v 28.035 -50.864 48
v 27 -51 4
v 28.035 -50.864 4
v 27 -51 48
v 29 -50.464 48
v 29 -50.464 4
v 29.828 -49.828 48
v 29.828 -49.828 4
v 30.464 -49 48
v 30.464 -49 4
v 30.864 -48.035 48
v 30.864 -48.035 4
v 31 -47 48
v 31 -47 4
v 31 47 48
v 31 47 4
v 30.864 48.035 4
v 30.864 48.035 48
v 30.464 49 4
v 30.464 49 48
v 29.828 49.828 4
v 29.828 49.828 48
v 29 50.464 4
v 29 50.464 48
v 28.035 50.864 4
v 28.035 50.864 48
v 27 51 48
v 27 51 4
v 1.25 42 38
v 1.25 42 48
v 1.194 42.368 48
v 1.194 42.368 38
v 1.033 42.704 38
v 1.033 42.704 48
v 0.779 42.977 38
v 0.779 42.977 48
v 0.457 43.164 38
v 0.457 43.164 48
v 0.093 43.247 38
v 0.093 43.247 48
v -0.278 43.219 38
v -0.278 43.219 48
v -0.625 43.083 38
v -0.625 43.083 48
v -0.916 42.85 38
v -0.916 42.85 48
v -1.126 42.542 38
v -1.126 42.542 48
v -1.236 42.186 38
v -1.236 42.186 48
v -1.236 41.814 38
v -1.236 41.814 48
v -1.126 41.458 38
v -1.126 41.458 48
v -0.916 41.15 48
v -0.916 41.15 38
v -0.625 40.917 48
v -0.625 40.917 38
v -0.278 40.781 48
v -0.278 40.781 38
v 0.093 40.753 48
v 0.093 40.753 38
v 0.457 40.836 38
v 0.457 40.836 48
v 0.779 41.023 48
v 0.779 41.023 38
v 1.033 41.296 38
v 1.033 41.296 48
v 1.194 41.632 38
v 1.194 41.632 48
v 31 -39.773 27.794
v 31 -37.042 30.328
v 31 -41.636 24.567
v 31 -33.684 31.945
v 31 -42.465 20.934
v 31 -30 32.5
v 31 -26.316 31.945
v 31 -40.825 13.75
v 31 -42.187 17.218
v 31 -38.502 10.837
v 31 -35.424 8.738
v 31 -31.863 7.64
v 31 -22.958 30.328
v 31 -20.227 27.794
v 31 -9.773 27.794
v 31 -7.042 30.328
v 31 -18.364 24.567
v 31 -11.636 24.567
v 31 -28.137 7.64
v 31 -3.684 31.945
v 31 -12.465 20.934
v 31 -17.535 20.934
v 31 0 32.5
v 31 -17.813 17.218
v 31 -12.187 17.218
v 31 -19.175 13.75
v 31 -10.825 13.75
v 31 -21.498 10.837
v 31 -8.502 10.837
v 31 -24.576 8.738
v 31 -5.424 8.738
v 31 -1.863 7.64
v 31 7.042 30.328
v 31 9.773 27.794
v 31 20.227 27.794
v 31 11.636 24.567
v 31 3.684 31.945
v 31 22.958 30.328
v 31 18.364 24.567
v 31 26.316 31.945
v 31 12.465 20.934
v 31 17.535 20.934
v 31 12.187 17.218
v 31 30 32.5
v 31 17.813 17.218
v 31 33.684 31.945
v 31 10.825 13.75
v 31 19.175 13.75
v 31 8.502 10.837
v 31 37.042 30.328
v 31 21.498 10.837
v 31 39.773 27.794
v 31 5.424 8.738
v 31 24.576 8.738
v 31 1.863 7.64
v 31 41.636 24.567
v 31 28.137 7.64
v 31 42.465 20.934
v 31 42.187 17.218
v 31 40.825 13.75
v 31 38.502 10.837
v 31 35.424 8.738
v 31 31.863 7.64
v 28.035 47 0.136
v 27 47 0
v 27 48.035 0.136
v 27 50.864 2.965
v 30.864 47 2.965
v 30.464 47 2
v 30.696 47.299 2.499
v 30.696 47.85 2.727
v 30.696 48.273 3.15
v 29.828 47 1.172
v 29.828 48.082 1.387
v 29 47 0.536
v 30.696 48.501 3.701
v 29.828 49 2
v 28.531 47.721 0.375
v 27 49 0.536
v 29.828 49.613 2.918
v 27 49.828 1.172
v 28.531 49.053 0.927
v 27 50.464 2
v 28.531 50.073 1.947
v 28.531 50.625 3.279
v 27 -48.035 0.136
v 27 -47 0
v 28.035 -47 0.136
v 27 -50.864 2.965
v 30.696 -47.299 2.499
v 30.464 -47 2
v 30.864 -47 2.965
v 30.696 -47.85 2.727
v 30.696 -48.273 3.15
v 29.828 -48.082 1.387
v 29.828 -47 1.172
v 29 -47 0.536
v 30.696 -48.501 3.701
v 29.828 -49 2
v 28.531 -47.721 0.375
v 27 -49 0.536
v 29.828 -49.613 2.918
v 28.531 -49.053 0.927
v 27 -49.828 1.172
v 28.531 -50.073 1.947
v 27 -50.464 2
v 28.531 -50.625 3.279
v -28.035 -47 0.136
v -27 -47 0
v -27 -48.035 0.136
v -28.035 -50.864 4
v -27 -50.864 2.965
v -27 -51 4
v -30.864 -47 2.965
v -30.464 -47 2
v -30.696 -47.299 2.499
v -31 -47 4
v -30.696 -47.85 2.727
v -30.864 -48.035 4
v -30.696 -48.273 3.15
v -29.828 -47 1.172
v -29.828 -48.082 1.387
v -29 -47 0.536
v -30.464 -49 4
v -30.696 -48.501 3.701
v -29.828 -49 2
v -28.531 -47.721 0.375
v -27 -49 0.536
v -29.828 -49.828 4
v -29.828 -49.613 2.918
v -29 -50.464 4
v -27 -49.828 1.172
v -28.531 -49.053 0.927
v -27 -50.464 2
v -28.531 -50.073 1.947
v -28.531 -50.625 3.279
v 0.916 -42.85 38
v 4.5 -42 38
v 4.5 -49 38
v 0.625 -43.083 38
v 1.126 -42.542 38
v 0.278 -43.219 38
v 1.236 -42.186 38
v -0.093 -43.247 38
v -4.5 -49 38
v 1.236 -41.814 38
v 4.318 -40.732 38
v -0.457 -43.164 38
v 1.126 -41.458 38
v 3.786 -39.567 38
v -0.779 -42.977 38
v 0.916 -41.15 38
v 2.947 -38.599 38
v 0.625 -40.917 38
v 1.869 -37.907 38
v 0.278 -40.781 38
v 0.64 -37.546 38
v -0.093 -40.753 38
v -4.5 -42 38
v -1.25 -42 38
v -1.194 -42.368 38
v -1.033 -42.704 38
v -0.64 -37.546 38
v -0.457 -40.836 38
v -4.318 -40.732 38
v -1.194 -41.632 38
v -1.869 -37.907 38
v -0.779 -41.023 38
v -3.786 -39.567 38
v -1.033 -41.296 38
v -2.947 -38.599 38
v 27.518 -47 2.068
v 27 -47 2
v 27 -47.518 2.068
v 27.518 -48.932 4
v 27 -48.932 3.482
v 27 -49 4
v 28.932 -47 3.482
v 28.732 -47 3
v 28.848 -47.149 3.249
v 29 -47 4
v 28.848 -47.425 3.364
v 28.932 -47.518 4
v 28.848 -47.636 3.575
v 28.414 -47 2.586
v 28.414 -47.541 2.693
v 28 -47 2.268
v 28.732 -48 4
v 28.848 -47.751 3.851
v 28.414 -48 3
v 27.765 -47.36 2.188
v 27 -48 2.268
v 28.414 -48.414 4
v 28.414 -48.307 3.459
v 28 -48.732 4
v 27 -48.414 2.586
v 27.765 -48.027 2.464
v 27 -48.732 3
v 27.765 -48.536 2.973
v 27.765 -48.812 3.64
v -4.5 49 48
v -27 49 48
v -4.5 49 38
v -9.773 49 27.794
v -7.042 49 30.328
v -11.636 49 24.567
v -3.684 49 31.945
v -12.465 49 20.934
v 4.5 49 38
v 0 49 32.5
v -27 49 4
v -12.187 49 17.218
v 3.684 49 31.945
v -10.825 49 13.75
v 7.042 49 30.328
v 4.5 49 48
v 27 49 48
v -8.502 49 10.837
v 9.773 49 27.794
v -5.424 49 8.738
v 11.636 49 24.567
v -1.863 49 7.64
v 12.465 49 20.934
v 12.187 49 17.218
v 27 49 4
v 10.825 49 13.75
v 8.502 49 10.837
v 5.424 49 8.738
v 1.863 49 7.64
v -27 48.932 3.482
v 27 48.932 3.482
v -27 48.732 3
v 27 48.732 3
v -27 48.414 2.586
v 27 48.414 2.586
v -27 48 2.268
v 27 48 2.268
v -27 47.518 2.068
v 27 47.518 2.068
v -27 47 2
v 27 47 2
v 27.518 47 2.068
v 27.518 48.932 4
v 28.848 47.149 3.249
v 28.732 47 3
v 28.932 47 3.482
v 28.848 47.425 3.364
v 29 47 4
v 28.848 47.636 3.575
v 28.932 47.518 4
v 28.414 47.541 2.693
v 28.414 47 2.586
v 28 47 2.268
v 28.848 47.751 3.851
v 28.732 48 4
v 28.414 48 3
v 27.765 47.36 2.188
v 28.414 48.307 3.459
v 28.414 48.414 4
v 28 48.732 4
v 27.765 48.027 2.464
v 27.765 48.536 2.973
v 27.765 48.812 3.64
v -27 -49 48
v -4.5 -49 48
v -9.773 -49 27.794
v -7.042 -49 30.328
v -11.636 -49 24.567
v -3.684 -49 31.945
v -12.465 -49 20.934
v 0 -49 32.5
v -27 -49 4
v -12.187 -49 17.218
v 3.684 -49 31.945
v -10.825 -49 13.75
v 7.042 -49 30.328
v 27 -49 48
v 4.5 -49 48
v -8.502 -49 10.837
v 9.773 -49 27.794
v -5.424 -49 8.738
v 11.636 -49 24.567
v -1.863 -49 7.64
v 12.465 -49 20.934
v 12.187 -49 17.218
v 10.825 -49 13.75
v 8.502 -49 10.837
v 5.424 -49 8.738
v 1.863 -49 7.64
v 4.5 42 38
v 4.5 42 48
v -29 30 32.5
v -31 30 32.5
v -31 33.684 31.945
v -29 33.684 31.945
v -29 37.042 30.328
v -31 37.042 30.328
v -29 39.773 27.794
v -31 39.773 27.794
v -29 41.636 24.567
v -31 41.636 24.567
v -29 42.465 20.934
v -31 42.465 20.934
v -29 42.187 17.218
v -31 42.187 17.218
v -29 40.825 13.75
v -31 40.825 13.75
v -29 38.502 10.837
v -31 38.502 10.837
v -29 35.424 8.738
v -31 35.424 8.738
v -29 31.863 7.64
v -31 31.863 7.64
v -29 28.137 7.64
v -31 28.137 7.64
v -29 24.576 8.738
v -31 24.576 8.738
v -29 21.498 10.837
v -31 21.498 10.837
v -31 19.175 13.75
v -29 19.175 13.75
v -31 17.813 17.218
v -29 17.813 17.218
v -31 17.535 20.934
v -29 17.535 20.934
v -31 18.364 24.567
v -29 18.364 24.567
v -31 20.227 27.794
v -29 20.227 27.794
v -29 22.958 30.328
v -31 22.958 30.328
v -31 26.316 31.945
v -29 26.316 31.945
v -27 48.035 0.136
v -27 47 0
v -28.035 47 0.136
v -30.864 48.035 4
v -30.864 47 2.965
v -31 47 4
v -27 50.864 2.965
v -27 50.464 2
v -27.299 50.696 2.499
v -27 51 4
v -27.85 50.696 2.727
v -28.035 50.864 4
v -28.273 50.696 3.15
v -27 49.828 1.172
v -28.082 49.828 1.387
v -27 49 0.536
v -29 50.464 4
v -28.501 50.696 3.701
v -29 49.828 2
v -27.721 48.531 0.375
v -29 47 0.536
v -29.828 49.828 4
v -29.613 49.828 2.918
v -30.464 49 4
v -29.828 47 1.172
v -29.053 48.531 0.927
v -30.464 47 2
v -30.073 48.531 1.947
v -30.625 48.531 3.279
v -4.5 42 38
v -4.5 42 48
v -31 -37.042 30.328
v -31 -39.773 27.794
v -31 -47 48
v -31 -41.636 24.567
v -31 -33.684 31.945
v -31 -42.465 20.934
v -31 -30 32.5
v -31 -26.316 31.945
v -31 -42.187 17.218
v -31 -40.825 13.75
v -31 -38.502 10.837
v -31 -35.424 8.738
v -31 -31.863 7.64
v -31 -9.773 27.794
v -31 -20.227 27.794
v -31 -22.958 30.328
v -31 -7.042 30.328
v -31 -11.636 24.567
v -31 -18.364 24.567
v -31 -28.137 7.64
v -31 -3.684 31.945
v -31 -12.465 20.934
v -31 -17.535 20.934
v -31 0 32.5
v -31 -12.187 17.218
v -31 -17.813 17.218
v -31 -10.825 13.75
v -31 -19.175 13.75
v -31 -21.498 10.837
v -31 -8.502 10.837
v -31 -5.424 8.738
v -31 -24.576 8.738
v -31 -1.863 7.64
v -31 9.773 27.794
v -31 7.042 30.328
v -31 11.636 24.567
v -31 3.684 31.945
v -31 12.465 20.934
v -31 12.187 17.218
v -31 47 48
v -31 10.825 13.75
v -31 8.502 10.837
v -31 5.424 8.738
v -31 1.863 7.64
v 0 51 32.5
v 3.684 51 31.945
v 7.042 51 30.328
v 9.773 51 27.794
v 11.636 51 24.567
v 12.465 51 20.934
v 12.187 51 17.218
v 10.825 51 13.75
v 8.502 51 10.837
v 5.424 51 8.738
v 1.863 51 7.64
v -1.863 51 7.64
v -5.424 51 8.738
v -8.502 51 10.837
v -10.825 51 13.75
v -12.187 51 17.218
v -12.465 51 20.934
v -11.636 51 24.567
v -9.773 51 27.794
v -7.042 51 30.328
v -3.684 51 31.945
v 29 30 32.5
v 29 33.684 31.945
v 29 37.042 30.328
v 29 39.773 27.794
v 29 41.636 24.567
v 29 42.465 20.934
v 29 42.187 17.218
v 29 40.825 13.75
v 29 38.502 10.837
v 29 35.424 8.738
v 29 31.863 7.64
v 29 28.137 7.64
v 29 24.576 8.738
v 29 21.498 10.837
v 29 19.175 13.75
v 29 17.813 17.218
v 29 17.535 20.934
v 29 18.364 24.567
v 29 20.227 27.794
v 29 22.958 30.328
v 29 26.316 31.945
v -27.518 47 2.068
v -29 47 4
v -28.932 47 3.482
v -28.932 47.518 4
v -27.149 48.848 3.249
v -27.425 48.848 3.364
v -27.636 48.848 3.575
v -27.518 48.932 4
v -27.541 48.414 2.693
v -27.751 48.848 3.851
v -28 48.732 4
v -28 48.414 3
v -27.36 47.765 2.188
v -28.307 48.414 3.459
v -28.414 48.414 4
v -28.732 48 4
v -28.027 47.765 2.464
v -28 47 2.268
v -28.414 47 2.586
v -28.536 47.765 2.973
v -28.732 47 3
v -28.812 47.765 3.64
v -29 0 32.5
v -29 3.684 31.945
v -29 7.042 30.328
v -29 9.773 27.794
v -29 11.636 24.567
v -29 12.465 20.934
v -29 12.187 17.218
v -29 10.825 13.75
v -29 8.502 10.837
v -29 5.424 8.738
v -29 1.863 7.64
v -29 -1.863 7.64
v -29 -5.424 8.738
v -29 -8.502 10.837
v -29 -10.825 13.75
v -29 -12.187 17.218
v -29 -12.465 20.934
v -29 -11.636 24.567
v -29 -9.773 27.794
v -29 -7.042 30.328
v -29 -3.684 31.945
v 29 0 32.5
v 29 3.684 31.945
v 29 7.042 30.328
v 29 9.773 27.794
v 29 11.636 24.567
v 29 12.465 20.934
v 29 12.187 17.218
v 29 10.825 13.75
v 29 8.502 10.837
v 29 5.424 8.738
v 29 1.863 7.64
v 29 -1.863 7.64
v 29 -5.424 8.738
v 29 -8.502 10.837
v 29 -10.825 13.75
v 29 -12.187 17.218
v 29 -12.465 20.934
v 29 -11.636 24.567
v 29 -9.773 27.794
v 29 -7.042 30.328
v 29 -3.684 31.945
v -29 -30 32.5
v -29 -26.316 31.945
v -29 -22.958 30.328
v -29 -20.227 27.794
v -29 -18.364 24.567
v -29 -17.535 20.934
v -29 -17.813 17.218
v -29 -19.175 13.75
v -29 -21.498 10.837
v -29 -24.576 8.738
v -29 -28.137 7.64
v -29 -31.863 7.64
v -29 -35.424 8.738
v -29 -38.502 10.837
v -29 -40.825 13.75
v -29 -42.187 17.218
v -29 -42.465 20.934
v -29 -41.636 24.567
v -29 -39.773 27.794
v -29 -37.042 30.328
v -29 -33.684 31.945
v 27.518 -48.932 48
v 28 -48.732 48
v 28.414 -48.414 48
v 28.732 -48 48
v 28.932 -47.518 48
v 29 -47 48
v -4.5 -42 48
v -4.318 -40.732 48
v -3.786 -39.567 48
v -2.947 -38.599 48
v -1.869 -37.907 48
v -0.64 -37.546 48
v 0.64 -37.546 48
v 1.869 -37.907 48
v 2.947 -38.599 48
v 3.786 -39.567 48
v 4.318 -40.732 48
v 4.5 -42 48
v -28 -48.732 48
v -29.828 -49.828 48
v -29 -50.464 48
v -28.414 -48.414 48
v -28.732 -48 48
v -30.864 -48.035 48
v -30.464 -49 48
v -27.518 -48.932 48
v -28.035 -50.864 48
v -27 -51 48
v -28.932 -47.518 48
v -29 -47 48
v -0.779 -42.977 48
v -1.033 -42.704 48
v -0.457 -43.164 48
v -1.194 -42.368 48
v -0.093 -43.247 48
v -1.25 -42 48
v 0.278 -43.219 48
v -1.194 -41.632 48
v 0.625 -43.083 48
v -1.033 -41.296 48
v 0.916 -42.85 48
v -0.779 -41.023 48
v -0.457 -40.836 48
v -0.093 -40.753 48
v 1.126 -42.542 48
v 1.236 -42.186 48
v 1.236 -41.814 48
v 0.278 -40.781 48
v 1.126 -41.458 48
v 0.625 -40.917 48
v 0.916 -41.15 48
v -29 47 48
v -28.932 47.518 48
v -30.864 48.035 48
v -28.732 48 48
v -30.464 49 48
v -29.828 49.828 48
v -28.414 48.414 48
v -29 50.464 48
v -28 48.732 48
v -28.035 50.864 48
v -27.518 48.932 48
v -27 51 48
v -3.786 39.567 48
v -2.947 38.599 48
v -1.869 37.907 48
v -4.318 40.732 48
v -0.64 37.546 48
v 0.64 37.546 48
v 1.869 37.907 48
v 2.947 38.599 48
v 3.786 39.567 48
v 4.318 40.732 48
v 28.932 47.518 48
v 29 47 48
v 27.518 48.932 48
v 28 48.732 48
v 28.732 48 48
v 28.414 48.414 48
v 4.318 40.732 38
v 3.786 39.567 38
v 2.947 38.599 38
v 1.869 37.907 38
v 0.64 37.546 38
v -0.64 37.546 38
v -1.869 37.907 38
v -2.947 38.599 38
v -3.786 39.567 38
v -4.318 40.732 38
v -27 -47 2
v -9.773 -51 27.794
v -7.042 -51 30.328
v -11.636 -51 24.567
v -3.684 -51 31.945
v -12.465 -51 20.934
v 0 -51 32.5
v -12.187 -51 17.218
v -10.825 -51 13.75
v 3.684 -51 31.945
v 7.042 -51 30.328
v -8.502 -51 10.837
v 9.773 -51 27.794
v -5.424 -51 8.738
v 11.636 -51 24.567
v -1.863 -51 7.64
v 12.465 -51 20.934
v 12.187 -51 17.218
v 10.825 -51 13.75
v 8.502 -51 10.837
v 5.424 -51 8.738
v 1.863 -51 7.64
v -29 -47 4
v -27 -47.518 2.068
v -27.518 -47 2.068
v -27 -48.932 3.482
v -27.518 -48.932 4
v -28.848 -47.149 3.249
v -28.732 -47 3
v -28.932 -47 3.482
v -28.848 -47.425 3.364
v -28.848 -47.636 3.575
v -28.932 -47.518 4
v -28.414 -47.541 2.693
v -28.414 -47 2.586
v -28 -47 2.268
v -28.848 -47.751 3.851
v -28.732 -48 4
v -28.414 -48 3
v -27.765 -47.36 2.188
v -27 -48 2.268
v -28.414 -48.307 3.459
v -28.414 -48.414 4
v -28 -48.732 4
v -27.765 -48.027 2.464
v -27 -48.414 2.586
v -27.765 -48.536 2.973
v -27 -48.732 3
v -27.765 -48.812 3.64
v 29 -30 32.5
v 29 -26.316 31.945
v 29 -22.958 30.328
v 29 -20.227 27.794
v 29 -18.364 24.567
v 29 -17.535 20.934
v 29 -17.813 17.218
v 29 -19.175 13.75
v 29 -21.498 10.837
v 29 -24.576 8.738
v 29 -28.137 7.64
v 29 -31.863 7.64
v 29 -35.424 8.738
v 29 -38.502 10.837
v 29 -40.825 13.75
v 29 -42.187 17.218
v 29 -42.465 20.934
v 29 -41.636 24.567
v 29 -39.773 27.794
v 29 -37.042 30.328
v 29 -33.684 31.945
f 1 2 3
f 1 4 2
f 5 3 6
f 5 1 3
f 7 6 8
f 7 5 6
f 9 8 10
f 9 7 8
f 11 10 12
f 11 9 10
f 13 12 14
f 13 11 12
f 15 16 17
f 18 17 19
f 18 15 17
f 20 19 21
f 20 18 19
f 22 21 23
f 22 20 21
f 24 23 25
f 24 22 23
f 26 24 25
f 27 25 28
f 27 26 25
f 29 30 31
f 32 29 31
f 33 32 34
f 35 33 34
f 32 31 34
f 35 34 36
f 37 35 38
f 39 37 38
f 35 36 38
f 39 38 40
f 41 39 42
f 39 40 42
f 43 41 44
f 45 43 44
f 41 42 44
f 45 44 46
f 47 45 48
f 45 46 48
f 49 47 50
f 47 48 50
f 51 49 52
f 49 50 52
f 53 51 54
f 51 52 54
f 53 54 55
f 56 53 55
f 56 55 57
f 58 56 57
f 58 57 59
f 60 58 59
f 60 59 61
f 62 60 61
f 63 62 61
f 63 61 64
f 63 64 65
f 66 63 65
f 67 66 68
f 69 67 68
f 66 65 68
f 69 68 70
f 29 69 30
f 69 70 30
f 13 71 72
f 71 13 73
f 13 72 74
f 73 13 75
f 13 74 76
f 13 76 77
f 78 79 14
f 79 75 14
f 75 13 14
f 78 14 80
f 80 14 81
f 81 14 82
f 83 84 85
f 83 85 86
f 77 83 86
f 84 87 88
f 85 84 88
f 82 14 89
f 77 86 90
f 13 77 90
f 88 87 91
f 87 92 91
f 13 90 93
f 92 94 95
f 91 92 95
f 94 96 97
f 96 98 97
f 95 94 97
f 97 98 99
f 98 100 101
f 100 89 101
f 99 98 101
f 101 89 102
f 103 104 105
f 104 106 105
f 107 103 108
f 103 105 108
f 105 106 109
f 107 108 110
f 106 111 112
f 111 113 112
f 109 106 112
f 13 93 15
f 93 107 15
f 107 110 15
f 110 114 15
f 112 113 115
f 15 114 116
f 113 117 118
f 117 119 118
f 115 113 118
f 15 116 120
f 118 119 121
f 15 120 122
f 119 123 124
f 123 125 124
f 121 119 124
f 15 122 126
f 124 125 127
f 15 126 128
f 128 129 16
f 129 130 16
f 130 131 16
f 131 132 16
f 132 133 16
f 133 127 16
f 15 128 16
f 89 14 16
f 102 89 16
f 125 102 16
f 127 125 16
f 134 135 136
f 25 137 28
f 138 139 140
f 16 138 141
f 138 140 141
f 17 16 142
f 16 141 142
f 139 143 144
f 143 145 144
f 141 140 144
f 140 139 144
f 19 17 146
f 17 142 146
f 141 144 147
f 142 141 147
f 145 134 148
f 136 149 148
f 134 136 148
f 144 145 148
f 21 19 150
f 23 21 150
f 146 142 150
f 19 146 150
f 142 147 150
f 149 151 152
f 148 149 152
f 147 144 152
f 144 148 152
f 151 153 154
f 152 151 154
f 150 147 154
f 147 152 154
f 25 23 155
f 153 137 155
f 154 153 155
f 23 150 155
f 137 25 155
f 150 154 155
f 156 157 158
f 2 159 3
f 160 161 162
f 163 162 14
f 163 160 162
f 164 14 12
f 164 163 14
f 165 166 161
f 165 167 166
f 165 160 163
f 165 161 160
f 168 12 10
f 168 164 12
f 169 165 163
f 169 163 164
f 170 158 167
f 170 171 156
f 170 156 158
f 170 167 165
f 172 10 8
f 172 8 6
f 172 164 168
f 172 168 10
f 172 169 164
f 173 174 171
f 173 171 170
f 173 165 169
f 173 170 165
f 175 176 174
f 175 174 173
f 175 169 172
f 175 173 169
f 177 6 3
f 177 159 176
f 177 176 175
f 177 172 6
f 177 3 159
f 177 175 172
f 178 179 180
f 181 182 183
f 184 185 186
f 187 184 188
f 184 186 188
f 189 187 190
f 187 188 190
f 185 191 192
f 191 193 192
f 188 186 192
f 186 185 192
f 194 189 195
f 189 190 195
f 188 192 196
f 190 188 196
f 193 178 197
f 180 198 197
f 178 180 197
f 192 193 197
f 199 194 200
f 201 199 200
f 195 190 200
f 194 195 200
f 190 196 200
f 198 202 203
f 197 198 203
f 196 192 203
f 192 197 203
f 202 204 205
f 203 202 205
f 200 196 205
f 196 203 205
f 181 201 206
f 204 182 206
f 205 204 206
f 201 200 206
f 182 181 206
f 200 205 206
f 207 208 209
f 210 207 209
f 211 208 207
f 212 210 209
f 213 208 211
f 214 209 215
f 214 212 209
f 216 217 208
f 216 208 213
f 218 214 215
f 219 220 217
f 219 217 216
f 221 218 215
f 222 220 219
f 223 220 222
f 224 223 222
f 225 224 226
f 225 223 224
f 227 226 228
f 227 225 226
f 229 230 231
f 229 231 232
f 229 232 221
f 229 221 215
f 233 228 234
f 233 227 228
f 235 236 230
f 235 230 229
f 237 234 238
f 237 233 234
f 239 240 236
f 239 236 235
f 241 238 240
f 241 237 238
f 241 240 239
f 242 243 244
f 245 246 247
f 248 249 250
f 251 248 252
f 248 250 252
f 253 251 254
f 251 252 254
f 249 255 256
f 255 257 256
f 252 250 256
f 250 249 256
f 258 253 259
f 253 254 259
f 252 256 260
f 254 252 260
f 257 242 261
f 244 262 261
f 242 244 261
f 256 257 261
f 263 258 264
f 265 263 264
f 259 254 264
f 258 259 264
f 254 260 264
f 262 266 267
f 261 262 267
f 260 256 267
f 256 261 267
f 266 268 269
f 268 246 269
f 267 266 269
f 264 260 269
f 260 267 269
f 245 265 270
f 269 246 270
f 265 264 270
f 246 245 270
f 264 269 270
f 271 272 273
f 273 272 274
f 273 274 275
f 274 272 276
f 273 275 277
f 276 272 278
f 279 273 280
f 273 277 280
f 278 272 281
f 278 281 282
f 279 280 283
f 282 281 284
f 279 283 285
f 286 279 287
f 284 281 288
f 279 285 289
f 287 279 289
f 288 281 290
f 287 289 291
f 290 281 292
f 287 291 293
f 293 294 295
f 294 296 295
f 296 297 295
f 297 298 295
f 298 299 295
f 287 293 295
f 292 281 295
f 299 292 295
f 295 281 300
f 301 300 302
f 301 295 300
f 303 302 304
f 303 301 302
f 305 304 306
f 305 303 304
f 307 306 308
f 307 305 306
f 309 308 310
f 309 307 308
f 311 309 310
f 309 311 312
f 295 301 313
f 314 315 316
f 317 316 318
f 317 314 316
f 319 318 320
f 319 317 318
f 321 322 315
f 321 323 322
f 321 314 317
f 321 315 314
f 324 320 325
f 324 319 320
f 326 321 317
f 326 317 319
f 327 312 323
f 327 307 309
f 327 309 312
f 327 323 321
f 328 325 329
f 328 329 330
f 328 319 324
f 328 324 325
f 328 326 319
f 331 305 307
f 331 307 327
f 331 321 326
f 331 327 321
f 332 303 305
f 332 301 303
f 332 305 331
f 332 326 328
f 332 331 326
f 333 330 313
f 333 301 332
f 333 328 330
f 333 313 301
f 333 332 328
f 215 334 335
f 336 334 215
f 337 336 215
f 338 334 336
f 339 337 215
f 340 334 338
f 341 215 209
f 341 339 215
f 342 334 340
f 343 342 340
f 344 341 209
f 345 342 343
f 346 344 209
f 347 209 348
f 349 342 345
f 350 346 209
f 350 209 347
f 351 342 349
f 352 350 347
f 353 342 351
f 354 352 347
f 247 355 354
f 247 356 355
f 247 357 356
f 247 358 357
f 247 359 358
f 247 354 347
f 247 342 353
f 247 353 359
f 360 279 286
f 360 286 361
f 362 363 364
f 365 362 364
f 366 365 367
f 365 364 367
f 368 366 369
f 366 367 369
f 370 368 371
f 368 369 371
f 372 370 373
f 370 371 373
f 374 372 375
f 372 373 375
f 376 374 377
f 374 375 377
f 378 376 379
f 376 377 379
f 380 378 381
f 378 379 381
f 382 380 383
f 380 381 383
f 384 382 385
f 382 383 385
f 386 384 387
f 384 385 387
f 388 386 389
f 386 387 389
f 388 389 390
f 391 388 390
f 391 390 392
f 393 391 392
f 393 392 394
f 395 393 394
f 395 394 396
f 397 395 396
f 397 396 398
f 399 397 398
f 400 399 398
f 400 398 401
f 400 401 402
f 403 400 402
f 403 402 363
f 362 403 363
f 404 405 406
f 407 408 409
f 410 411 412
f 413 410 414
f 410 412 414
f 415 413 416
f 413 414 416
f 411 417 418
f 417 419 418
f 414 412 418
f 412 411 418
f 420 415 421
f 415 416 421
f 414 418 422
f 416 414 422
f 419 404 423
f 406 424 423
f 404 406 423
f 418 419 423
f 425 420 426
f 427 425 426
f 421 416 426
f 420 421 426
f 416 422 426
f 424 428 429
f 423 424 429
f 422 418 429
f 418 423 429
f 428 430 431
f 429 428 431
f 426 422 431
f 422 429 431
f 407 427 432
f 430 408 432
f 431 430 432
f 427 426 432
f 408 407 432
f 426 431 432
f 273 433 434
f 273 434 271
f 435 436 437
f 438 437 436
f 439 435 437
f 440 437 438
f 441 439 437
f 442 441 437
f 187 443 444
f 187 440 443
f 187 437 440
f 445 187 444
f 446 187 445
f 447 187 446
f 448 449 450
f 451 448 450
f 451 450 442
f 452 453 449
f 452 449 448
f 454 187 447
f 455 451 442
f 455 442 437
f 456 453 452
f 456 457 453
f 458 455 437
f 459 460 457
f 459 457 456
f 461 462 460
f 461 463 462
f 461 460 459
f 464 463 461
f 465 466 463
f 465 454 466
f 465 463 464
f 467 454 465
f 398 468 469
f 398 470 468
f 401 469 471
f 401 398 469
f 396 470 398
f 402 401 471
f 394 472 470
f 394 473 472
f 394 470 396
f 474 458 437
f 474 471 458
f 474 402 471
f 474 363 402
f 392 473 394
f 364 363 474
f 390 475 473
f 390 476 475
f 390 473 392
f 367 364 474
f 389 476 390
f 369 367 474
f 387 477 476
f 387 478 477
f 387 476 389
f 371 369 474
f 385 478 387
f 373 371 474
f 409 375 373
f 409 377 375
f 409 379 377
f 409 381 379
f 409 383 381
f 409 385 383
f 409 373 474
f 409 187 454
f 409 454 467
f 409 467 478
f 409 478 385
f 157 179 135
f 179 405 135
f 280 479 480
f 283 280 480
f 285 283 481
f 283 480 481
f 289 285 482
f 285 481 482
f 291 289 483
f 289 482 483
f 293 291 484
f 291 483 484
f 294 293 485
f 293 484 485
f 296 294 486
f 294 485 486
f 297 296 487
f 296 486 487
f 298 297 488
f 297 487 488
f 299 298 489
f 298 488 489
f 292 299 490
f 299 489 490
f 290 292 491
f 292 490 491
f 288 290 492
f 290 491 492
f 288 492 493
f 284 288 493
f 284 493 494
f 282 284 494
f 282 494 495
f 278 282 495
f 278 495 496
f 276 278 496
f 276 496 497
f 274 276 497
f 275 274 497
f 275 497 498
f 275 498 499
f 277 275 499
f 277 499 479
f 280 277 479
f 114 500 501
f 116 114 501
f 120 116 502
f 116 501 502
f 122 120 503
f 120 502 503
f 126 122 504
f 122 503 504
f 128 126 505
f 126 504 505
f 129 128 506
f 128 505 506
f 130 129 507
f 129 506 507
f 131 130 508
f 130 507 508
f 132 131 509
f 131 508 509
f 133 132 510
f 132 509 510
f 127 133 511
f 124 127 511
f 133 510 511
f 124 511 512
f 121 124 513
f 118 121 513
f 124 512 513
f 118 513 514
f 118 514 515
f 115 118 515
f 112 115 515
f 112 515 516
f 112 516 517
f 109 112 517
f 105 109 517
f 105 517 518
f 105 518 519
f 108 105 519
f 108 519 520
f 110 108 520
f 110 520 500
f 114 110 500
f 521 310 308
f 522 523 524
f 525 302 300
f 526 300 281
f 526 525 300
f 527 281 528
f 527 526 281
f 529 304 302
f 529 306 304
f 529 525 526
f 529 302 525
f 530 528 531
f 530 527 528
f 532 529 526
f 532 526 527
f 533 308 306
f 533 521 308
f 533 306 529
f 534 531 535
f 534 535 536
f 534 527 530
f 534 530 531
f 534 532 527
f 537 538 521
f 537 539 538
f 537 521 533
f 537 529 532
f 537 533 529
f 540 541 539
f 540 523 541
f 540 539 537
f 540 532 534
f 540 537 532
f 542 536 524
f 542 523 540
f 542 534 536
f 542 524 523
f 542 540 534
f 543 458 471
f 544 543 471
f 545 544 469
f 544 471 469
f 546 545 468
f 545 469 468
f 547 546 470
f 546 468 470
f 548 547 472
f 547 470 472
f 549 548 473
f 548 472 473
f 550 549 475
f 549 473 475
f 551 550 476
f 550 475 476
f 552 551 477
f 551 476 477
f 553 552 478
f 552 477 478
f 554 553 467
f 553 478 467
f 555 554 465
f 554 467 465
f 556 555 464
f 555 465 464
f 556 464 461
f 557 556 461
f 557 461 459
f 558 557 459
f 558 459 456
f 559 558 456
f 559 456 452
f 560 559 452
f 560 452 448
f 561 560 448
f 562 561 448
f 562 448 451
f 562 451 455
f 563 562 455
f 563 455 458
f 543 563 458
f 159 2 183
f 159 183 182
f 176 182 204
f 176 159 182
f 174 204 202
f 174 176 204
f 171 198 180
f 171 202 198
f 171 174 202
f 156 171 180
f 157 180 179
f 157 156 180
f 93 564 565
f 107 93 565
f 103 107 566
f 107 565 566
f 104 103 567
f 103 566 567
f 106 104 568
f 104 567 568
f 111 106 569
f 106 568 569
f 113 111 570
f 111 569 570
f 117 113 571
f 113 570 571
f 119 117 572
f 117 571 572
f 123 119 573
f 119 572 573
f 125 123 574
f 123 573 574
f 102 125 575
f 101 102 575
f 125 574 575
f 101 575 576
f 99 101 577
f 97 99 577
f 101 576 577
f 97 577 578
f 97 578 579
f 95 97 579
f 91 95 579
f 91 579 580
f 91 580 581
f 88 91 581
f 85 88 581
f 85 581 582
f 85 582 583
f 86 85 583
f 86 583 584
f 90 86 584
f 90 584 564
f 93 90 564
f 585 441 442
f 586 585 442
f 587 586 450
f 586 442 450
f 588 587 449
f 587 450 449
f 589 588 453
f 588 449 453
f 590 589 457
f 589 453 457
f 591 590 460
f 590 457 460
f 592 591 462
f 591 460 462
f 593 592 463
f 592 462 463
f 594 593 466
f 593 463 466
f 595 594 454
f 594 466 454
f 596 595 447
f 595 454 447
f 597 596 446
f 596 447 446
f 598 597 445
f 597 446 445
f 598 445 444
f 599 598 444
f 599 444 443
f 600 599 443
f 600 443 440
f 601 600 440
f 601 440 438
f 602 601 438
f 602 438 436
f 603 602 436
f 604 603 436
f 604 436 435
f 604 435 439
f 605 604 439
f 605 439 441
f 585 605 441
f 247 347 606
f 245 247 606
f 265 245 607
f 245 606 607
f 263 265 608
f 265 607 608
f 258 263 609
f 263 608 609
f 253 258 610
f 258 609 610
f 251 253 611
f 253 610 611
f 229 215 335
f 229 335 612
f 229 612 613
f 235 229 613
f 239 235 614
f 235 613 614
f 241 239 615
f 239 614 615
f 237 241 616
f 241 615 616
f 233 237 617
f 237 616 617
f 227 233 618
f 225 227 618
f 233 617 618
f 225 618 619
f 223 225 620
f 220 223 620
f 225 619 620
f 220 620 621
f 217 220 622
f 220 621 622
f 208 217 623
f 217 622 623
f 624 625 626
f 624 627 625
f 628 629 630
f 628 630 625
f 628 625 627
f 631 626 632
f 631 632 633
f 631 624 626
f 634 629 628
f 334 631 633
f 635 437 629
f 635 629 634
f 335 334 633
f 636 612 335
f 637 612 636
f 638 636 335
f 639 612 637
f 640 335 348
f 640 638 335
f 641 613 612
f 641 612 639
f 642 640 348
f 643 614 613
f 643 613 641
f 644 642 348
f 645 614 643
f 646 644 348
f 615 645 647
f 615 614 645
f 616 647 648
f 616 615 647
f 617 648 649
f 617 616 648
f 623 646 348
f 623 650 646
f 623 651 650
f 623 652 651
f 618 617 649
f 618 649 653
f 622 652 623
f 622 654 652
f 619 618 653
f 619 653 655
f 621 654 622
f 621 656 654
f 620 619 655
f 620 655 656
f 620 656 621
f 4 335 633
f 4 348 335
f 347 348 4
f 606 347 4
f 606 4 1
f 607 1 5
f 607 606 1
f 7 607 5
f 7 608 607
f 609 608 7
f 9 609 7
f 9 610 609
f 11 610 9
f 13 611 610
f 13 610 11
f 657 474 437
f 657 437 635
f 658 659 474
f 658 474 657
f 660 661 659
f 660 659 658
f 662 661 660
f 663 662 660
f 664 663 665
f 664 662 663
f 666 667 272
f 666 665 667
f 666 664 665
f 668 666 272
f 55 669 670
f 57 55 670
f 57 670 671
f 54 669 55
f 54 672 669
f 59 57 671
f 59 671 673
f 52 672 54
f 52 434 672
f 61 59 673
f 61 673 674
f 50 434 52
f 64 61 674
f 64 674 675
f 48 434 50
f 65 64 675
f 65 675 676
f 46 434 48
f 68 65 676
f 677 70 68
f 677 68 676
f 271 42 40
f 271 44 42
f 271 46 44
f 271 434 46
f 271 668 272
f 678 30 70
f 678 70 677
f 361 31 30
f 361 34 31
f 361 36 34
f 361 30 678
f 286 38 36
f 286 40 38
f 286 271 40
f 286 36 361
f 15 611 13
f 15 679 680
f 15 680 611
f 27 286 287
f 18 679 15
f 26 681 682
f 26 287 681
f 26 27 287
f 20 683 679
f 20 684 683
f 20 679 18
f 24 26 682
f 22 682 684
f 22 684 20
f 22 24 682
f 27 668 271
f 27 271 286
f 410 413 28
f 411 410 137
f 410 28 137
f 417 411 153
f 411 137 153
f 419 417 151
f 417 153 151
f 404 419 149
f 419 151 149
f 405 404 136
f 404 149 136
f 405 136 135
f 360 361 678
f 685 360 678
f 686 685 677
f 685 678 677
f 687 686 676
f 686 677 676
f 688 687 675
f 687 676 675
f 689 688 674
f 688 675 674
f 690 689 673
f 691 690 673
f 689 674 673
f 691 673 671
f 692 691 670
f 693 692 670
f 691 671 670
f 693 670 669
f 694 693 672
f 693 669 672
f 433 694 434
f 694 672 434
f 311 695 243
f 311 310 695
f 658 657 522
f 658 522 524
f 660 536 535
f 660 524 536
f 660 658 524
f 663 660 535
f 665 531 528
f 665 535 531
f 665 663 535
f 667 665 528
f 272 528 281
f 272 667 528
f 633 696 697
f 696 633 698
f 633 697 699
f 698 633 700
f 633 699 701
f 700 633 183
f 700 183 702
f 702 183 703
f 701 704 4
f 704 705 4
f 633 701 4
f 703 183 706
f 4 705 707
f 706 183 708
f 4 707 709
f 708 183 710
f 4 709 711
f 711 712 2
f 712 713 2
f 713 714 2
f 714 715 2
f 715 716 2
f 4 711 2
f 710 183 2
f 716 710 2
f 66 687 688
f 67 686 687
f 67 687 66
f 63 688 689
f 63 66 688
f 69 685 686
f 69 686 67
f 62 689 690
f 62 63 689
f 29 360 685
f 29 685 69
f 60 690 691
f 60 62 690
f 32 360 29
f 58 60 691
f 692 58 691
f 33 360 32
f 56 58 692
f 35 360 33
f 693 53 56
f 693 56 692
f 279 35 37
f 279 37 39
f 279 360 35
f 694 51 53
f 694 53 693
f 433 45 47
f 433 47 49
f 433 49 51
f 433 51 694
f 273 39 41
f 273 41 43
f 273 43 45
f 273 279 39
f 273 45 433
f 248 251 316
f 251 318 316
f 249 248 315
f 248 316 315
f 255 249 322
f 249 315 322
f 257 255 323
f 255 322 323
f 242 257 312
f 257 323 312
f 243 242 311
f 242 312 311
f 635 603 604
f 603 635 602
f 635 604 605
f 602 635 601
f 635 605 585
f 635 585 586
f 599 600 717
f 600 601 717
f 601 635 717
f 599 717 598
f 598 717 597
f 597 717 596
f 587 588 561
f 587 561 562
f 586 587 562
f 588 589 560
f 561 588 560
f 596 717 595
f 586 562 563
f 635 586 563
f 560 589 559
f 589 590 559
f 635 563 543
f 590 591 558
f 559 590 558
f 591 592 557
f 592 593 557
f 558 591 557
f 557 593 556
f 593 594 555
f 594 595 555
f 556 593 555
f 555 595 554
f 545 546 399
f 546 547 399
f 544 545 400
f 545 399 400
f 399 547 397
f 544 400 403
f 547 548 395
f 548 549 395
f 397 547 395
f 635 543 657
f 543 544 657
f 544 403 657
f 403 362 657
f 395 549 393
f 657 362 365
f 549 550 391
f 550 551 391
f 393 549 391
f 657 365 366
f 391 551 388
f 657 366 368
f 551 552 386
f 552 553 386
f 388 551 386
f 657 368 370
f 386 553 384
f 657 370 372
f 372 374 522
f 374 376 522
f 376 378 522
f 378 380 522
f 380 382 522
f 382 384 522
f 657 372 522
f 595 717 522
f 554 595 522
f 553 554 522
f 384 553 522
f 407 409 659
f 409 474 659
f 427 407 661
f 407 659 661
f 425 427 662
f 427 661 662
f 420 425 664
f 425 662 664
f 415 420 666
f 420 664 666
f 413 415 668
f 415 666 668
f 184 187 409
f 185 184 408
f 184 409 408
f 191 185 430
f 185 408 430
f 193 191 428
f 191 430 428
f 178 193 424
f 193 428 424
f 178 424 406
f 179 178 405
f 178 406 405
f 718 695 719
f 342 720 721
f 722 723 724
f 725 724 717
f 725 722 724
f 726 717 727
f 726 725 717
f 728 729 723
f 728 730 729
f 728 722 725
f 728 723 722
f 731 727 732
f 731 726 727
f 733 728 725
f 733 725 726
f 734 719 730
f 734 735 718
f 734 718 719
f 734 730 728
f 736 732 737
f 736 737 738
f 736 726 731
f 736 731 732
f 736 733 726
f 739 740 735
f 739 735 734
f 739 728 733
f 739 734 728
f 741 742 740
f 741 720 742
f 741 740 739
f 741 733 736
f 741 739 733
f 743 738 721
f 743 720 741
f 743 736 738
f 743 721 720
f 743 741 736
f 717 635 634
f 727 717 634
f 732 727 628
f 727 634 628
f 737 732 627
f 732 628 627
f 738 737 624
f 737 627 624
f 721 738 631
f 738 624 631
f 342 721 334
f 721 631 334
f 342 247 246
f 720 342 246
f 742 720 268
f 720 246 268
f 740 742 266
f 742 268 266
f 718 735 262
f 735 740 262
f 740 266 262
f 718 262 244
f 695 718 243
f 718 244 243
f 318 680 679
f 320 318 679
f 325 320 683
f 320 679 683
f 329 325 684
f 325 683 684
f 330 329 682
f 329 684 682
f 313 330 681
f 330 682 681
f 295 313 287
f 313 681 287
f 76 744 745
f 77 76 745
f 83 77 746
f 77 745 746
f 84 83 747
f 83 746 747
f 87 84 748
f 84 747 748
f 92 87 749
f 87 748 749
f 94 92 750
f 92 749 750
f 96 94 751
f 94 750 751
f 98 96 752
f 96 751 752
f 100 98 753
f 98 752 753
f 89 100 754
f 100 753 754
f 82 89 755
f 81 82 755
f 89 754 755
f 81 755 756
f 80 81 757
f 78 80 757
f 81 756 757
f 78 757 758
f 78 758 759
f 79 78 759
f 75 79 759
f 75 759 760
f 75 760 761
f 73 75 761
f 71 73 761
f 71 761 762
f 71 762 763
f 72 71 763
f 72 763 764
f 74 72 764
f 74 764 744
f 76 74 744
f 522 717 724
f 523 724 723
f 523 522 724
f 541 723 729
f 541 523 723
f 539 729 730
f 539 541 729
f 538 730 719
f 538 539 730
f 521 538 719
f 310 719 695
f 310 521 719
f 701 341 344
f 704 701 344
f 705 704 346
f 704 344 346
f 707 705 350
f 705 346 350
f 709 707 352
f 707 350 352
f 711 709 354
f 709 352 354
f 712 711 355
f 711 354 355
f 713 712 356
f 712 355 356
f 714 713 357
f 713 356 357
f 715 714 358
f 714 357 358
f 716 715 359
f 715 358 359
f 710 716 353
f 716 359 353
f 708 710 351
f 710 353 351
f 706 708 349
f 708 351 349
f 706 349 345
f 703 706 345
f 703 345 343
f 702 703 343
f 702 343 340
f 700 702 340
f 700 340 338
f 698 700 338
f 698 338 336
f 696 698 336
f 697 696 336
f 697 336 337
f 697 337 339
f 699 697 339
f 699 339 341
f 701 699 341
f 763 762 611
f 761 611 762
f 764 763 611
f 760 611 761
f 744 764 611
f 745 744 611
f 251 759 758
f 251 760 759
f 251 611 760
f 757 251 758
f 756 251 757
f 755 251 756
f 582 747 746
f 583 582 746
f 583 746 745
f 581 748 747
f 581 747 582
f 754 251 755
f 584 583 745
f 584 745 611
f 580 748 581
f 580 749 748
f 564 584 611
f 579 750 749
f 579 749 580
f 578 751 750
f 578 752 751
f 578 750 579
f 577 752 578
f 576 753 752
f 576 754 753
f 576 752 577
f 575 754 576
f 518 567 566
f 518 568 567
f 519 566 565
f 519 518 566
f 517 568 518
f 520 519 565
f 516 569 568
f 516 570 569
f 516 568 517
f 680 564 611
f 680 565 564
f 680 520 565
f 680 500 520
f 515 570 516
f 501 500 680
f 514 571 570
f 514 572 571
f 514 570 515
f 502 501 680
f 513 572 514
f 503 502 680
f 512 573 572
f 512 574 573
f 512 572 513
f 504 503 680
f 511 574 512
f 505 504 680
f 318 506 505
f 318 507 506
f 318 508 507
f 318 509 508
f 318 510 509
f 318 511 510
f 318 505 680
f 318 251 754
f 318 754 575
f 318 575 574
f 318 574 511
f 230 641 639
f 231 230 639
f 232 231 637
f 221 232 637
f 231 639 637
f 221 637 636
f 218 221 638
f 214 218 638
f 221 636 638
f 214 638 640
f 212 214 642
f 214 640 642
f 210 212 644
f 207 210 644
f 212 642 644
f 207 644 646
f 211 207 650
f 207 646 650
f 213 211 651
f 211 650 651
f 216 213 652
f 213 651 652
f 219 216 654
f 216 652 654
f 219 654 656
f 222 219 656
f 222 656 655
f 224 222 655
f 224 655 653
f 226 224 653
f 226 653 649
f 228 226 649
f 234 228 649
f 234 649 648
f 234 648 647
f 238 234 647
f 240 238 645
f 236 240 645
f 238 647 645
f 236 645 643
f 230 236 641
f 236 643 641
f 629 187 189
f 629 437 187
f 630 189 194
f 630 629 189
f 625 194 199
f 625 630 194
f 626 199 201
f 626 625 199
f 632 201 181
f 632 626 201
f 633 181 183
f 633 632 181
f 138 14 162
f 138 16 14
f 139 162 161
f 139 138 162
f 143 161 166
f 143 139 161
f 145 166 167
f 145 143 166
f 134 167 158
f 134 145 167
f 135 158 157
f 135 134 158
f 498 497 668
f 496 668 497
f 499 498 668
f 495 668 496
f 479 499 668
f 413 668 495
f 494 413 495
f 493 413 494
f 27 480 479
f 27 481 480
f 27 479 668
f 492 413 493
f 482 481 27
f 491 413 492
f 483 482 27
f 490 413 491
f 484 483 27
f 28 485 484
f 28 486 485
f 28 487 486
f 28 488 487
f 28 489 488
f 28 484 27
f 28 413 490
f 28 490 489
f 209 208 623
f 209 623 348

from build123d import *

# Parameters (mm, degrees)
ESBO_O1_W                = 62
ESBO_O1_H                = 102
RESSALTO_EXTRUS_O1_DEPTH = 48
FILETE1_R                = 4
CASCA1_T                 = -2
ESBO_O2_R                = 12.5
CORTE_EXTRUS_O1_DEPTH    = 94.536089292
ESBO_O3_R                = 12.5
CORTE_EXTRUS_O2_DEPTH    = 117.914498673
ESBO_O4_R                = 1.25
RESSALTO_EXTRUS_O2_DEPTH = 10


with BuildPart() as part:
    # Esboço1 → Ressalto-extrusão1 (new body)
    with BuildSketch(Plane.XY):
        Rectangle(ESBO_O1_W, ESBO_O1_H)
    extrude(amount=RESSALTO_EXTRUS_O1_DEPTH)

    # Filete1
    filete1_edges = [part.edges().sort_by_distance(p)[0] for p in [
        (0, -51, 0),
        (-31, 0, 0),
        (0, 51, 0),
        (31, 0, 0),
        (31, -51, 24),
        (-31, -51, 24),
        (-31, 51, 24),
        (31, 51, 24),
    ]]
    fillet(filete1_edges, radius=FILETE1_R)

    # Casca1
    casca1_openings = [part.faces().sort_by_distance(p)[0] for p in [
        (0, 0, 48),
    ]]
    offset(amount=CASCA1_T, openings=casca1_openings, kind=Kind.INTERSECTION)

    # Esboço2 → Corte-extrusão1 (cut, through all)
    with BuildSketch(Plane.ZY.offset(31)):
        with Locations((20, 0)):
            Circle(ESBO_O2_R)
        with Locations((20, 30)):
            Circle(ESBO_O2_R)
        with Locations((20, -30)):
            Circle(ESBO_O2_R)
    extrude(amount=-CORTE_EXTRUS_O1_DEPTH, mode=Mode.SUBTRACT)

    # Esboço3 → Corte-extrusão2 (cut, through all)
    with BuildSketch(Plane(origin=(0, 51, 0), x_dir=(1, 0, 0), z_dir=(0, 1, 0))):
        with Locations(Location((0, -20, 0), (0, 0, 270))):
            Circle(ESBO_O3_R)
    extrude(amount=-CORTE_EXTRUS_O2_DEPTH, mode=Mode.SUBTRACT)

    # Esboço4 → Ressalto-extrusão2 (add)
    # profile 1 of 2: a face of its own
    with BuildSketch(Plane.XY.offset(48)):
        with BuildLine():
            Line((-4.5, 42), (-4.5, 49))
            Line((-4.5, 49), (4.5, 49))
            Line((4.5, 49), (4.5, 42))
            ThreePointArc((4.5, 42), (0, 37.5), (-4.5, 42))
        make_face()
        with Locations((0, 42)):
            Circle(ESBO_O4_R, mode=Mode.SUBTRACT)
    # profile 2 of 2: a face of its own
    with BuildSketch(Plane.XY.offset(48)):
        with BuildLine():
            Line((4.5, -49), (-4.5, -49))
            Line((-4.5, -49), (-4.5, -42))
            ThreePointArc((-4.5, -42), (0, -37.5), (4.5, -42))
            Line((4.5, -42), (4.5, -49))
        make_face()
        with Locations(Location((0, -42, 0), (0, 0, 180))):
            Circle(ESBO_O4_R, mode=Mode.SUBTRACT)
    extrude(amount=-RESSALTO_EXTRUS_O2_DEPTH)


solid = part.part
